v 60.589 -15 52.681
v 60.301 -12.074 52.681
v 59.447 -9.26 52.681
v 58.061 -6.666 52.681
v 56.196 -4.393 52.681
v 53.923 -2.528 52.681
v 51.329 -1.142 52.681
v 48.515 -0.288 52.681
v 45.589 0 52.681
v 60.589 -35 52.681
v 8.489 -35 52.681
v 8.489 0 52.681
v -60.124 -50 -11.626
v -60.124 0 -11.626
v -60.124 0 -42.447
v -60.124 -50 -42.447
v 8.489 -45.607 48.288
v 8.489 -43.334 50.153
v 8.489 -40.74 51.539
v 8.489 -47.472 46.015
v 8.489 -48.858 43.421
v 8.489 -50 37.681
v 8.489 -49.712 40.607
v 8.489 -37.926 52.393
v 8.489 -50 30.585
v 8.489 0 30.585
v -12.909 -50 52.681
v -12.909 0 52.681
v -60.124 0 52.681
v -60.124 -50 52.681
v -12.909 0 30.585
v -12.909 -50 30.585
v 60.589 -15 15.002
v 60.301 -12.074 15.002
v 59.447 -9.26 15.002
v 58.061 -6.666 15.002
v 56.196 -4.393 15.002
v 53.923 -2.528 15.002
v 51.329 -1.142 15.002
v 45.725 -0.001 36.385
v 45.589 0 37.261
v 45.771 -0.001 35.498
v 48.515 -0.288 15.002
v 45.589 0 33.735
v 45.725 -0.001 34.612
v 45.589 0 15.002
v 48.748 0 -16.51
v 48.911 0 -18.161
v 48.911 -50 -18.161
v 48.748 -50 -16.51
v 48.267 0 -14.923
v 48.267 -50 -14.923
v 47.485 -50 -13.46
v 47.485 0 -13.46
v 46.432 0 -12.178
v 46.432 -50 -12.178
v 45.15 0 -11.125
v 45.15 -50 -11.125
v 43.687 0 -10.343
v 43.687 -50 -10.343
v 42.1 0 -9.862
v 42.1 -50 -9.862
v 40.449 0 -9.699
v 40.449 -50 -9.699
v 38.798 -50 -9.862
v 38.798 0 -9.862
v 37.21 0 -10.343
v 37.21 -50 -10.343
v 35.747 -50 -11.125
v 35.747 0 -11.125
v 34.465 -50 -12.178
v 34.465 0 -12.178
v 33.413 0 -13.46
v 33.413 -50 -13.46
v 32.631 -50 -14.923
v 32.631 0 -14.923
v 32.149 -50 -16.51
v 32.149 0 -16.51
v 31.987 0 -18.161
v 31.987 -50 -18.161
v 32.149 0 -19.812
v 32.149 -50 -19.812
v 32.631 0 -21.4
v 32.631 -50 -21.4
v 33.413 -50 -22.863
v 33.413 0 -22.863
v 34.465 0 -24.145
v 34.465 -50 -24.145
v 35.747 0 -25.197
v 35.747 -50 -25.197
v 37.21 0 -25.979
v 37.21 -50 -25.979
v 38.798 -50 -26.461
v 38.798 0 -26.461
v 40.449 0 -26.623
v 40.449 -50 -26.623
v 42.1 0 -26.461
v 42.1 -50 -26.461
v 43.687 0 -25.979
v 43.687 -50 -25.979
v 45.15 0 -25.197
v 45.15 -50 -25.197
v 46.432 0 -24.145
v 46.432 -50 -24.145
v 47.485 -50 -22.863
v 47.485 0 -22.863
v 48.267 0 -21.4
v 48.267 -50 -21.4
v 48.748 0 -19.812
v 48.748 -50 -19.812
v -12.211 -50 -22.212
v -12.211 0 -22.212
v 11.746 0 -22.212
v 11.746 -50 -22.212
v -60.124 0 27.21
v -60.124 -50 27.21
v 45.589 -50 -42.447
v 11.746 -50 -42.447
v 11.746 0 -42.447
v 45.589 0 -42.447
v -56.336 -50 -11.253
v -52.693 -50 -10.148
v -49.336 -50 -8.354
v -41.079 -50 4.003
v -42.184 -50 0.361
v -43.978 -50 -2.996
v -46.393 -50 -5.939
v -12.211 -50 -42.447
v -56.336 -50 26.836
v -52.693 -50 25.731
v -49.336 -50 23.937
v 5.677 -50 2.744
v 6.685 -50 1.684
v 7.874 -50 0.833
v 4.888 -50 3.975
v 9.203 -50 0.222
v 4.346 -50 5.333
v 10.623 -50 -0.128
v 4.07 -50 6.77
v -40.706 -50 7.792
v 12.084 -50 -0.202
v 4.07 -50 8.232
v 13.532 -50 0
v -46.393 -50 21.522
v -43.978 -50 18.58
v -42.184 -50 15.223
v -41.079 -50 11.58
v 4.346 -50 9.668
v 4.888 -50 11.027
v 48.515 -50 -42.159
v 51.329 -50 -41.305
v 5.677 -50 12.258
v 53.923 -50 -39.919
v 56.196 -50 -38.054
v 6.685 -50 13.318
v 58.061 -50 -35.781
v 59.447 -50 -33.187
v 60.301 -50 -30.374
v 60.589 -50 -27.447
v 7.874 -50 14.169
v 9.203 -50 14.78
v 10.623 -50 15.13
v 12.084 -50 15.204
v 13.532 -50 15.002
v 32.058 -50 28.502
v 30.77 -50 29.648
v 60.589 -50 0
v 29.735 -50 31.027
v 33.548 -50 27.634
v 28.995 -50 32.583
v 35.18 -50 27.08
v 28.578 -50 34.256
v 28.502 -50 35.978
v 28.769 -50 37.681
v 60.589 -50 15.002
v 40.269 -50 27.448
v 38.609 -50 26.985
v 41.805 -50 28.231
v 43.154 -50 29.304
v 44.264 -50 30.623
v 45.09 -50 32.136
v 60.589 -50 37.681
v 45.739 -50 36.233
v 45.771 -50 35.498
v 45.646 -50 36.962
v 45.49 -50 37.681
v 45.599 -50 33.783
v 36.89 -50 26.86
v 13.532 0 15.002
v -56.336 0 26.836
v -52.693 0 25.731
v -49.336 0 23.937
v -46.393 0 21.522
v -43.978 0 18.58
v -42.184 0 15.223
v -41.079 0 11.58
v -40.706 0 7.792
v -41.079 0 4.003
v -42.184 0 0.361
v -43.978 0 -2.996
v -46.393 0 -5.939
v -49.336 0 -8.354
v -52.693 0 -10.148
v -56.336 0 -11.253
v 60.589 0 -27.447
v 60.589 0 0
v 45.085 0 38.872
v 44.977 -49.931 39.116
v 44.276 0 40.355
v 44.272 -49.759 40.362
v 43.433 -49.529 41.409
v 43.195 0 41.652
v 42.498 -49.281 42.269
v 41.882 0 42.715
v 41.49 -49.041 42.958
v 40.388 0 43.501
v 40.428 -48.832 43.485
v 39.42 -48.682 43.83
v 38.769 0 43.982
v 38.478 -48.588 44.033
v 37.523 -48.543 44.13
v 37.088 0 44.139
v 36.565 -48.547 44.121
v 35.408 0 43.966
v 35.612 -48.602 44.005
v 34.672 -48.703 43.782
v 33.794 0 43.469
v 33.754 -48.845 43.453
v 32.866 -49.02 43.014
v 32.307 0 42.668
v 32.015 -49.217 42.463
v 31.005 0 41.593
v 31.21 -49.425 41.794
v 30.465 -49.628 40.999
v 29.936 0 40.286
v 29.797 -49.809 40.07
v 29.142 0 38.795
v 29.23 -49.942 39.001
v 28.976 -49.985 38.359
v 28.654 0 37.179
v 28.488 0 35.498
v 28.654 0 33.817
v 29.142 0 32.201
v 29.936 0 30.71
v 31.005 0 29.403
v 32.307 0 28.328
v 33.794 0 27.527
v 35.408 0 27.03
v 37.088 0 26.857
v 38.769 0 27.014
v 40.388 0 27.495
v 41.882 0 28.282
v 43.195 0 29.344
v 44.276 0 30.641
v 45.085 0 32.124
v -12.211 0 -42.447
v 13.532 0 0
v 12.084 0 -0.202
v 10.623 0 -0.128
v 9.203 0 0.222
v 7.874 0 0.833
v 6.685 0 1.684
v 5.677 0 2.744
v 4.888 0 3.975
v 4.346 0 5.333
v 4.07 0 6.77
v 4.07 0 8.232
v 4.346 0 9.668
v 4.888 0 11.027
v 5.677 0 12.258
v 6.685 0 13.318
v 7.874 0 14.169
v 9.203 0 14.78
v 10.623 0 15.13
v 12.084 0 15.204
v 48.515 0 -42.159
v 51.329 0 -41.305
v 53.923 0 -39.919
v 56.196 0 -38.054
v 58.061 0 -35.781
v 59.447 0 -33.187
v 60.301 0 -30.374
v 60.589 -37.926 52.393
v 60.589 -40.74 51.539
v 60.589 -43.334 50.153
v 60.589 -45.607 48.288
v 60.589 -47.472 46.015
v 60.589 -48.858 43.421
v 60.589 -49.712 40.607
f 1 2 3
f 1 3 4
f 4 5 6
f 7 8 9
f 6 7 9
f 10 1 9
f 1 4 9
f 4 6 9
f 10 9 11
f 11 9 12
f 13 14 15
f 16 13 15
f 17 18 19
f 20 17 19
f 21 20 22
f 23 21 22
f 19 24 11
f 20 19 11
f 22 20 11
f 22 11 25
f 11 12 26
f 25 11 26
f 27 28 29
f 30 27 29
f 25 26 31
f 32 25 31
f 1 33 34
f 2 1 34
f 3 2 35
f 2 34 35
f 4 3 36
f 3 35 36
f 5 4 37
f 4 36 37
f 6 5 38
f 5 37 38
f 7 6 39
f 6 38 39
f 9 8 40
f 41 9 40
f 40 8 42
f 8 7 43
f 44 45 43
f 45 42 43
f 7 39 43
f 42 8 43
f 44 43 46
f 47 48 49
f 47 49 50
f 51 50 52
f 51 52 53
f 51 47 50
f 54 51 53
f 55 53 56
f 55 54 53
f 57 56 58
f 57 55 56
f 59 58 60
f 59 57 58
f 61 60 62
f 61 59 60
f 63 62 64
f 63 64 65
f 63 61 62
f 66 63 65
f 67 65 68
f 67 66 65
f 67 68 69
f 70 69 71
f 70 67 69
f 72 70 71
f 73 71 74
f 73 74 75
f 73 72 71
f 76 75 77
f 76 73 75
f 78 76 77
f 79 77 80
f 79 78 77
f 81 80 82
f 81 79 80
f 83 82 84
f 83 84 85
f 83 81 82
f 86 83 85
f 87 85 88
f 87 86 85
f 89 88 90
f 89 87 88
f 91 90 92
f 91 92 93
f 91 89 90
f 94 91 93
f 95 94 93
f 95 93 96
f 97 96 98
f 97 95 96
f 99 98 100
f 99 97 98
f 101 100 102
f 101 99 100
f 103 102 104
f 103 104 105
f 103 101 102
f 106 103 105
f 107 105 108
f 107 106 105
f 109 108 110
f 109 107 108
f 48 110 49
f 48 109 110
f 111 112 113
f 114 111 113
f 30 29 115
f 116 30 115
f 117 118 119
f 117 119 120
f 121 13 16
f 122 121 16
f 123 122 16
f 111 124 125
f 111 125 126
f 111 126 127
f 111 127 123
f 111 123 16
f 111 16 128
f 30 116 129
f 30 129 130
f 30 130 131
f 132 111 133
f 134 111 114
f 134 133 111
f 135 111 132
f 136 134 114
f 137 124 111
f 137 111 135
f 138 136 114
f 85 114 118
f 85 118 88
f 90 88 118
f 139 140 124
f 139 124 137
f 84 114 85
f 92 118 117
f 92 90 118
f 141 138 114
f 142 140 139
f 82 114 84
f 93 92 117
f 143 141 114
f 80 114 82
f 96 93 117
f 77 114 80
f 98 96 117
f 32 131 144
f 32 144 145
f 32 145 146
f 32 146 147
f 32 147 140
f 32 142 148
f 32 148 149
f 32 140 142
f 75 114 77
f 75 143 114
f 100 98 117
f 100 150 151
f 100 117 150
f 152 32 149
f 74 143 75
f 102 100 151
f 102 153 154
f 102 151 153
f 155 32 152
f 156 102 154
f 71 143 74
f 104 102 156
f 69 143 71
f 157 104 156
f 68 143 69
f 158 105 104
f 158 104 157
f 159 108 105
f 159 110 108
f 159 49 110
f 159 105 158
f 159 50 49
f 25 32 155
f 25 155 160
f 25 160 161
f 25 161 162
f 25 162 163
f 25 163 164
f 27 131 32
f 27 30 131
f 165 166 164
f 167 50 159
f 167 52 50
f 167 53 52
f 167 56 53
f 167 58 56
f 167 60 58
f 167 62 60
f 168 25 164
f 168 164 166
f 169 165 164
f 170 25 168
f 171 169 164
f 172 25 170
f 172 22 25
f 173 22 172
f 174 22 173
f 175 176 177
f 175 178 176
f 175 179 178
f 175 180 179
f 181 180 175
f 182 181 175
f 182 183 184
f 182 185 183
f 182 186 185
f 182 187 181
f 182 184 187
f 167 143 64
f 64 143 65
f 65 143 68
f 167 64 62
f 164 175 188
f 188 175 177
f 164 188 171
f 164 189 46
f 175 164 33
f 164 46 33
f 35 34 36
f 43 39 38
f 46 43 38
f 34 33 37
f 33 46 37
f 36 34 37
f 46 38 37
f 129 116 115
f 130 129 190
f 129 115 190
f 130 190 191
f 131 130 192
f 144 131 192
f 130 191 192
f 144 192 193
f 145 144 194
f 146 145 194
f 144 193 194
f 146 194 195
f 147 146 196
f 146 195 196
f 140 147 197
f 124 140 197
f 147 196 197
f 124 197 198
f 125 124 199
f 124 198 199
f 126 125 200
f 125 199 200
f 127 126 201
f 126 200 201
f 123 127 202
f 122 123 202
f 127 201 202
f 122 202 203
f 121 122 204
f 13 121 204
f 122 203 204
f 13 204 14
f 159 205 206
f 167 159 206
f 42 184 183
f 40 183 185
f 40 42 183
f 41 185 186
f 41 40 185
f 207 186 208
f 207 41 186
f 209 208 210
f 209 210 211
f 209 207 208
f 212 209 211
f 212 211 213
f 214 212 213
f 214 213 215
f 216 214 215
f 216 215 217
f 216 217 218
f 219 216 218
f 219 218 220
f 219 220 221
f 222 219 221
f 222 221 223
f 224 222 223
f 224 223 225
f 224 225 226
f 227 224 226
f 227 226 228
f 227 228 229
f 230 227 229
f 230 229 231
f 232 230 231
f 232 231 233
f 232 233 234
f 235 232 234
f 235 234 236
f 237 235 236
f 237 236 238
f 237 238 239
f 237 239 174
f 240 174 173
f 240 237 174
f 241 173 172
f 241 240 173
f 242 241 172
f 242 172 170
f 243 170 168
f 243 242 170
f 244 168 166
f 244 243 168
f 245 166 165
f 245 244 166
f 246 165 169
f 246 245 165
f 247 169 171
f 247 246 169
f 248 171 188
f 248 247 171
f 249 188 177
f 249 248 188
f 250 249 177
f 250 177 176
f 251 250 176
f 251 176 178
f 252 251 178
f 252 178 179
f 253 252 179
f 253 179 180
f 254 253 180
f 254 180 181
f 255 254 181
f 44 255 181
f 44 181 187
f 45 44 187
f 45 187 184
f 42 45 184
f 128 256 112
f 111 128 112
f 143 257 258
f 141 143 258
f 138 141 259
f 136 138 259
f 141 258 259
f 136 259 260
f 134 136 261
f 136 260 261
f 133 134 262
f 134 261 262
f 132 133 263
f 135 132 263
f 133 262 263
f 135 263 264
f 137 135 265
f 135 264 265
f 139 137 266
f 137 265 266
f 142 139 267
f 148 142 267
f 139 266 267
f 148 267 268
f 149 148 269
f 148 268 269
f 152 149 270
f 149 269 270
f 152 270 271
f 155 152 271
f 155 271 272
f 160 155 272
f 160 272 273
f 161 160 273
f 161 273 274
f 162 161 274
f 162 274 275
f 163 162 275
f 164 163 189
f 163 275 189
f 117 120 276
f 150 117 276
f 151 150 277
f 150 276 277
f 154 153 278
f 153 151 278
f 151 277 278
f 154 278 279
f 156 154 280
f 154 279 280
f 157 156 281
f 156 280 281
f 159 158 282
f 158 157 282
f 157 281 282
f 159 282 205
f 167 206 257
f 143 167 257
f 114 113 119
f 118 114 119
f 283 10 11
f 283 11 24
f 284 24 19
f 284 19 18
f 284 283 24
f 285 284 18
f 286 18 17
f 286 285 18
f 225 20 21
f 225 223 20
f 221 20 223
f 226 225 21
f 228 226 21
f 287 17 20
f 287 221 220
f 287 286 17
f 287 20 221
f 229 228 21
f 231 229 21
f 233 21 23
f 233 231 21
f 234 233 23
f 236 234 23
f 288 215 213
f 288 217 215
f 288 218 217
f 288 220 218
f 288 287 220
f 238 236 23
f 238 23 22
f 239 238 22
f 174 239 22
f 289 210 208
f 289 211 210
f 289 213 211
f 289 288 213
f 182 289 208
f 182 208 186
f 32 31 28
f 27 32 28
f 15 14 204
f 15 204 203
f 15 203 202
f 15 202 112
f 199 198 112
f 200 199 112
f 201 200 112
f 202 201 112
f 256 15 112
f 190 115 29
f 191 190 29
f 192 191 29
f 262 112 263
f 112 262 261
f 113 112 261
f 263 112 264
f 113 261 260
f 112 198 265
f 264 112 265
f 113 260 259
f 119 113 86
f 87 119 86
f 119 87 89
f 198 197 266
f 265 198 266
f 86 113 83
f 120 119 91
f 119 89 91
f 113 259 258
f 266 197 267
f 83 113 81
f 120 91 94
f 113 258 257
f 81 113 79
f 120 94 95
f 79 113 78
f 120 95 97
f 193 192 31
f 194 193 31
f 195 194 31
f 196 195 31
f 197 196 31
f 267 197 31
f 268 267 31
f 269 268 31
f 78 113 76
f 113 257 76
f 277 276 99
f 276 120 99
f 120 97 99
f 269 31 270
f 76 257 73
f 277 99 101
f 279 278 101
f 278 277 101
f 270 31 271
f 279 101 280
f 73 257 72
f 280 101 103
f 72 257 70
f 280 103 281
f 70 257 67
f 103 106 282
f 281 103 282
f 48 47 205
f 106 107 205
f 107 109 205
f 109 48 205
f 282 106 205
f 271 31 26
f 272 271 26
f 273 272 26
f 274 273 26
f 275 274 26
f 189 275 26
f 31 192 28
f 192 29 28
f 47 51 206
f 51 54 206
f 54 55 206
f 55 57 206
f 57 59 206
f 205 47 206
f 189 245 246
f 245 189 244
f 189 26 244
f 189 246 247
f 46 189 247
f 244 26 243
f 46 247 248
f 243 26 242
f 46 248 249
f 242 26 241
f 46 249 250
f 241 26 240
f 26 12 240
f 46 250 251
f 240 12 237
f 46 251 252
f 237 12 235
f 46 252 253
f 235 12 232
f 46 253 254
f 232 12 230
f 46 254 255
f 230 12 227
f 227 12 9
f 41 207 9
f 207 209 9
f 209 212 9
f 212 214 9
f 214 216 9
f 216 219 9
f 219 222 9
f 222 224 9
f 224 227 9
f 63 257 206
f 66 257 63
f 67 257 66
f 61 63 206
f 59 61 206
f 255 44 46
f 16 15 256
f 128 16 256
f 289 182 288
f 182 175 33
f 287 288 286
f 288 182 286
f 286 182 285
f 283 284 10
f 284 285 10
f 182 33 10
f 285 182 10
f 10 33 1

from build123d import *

# Parameters (mm, degrees)
F0_R        = 8.4621636151
F0_R_2      = 8.6410874337
F1_DEPTH    = 50
F4_T1_DEPTH = 125
F4_T3_DEPTH = 75.1791274175
F4_T8_DEPTH = 127.0995380357


# Not quite as in the source:
# - a fillet or chamfer that OpenCascade refuses, or shapes differently, is made with other operations: its cross-section is extruded or revolved along the edge and cut away or added
# - a feature of the source that left no trace in its solid (it failed there, or was rolled back) is left out


with BuildPart() as f1:
    # F0 (on Front) → F1 (new body)
    with BuildSketch(Plane.XZ):
        with BuildLine():
            Line((-12.9085844383, 52.6810027659), (-60.1237900555, 52.6810027659))
            Line((-60.1237900555, 52.6810027659), (-60.1237900555, 27.209569862))
            ThreePointArc((-60.1237900555, 27.209569862), (-40.7058920955, 7.7916719019), (-60.1237900555, -11.6262260581))
            Line((-60.1237900555, -11.6262260581), (-60.1237900555, -42.4471646547))
            Line((-60.1237900555, -42.4471646547), (-12.2108235955, -42.4471646547))
            Line((-12.2108235955, -42.4471646547), (-12.2108235955, -22.2120806575))
            Line((-12.2108235955, -22.2120806575), (11.7456596345, -22.2120806575))
            Line((11.7456596345, -22.2120806575), (11.7456596345, -42.4471646547))
            Line((11.7456596345, -42.4471646547), (60.588978231, -42.4471646547))
            Line((60.588978231, -42.4471646547), (60.588978231, 0))
            Line((60.588978231, 0), (13.5322010265, 0))
            ThreePointArc((13.5322010265, 0), (4.0349011674, 7.5009376742), (13.5322010265, 15.0018753484))
            Line((13.5322010265, 15.0018753484), (60.588978231, 15.0018753484))
            Line((60.588978231, 15.0018753484), (60.588978231, 52.6810027659))
            Line((60.588978231, 52.6810027659), (8.4894401953, 52.6810027659))
            Line((8.4894401953, 52.6810027659), (8.4894401953, 30.5852182209))
            Line((8.4894401953, 30.5852182209), (-12.9085844383, 30.5852182209))
            Line((-12.9085844383, 30.5852182209), (-12.9085844383, 52.6810027659))
        make_face()
        with Locations((40.4487065971, -18.1611850858)):
            Circle(F0_R, mode=Mode.SUBTRACT)
        with Locations((37.1295772493, 35.4981198907)):
            Circle(F0_R_2, mode=Mode.SUBTRACT)
    extrude(amount=F1_DEPTH)

    # F4: fillet of radius 15 on 3 edges, made by hand

    # F4_s2 → F4_t1 (cut)
    with BuildSketch(Plane.XZ.offset(-37.5)):
        with BuildLine():
            ThreePointArc((45.588978231, -42.4471646547), (56.1955799488, -38.0537663725), (60.588978231, -27.4471646547))
            Line((60.588978231, -27.4471646547), (60.588978231, -42.4471646547))
            Line((60.588978231, -42.4471646547), (45.588978231, -42.4471646547))
        make_face()
    extrude(amount=F4_T1_DEPTH, mode=Mode.SUBTRACT)

    # F4_s4 → F4_t3 (cut)
    with BuildSketch(Plane.XY.offset(15.0018753484)):
        with BuildLine():
            ThreePointArc((60.588978231, -15), (56.1955799488, -4.3933982822), (45.588978231, 0))
            Line((45.588978231, 0), (60.588978231, 0))
            Line((60.588978231, 0), (60.588978231, -15))
        make_face()
    extrude(amount=F4_T3_DEPTH, mode=Mode.SUBTRACT)


with BuildPart() as f4_tool6:
    # F4_s7 → F4_t8 (new body)
    with BuildSketch(Plane.YZ.offset(98.088978231)):
        with BuildLine():
            ThreePointArc((-35, 52.6810027659), (-45.6066017178, 48.2876044837), (-50, 37.6810027659))
            Line((-50, 37.6810027659), (-50, 52.6810027659))
            Line((-50, 52.6810027659), (-35, 52.6810027659))
        make_face()
    extrude(amount=-F4_T8_DEPTH)

    split(bisect_by=Plane.YZ.offset(-12.9085844383), keep=Keep.TOP)


with BuildPart() as f1_1:
    add(f1.part)

    # F4_t5: cut F4_tool6
    add(f4_tool6.part, mode=Mode.SUBTRACT)


solid = f1_1.part
